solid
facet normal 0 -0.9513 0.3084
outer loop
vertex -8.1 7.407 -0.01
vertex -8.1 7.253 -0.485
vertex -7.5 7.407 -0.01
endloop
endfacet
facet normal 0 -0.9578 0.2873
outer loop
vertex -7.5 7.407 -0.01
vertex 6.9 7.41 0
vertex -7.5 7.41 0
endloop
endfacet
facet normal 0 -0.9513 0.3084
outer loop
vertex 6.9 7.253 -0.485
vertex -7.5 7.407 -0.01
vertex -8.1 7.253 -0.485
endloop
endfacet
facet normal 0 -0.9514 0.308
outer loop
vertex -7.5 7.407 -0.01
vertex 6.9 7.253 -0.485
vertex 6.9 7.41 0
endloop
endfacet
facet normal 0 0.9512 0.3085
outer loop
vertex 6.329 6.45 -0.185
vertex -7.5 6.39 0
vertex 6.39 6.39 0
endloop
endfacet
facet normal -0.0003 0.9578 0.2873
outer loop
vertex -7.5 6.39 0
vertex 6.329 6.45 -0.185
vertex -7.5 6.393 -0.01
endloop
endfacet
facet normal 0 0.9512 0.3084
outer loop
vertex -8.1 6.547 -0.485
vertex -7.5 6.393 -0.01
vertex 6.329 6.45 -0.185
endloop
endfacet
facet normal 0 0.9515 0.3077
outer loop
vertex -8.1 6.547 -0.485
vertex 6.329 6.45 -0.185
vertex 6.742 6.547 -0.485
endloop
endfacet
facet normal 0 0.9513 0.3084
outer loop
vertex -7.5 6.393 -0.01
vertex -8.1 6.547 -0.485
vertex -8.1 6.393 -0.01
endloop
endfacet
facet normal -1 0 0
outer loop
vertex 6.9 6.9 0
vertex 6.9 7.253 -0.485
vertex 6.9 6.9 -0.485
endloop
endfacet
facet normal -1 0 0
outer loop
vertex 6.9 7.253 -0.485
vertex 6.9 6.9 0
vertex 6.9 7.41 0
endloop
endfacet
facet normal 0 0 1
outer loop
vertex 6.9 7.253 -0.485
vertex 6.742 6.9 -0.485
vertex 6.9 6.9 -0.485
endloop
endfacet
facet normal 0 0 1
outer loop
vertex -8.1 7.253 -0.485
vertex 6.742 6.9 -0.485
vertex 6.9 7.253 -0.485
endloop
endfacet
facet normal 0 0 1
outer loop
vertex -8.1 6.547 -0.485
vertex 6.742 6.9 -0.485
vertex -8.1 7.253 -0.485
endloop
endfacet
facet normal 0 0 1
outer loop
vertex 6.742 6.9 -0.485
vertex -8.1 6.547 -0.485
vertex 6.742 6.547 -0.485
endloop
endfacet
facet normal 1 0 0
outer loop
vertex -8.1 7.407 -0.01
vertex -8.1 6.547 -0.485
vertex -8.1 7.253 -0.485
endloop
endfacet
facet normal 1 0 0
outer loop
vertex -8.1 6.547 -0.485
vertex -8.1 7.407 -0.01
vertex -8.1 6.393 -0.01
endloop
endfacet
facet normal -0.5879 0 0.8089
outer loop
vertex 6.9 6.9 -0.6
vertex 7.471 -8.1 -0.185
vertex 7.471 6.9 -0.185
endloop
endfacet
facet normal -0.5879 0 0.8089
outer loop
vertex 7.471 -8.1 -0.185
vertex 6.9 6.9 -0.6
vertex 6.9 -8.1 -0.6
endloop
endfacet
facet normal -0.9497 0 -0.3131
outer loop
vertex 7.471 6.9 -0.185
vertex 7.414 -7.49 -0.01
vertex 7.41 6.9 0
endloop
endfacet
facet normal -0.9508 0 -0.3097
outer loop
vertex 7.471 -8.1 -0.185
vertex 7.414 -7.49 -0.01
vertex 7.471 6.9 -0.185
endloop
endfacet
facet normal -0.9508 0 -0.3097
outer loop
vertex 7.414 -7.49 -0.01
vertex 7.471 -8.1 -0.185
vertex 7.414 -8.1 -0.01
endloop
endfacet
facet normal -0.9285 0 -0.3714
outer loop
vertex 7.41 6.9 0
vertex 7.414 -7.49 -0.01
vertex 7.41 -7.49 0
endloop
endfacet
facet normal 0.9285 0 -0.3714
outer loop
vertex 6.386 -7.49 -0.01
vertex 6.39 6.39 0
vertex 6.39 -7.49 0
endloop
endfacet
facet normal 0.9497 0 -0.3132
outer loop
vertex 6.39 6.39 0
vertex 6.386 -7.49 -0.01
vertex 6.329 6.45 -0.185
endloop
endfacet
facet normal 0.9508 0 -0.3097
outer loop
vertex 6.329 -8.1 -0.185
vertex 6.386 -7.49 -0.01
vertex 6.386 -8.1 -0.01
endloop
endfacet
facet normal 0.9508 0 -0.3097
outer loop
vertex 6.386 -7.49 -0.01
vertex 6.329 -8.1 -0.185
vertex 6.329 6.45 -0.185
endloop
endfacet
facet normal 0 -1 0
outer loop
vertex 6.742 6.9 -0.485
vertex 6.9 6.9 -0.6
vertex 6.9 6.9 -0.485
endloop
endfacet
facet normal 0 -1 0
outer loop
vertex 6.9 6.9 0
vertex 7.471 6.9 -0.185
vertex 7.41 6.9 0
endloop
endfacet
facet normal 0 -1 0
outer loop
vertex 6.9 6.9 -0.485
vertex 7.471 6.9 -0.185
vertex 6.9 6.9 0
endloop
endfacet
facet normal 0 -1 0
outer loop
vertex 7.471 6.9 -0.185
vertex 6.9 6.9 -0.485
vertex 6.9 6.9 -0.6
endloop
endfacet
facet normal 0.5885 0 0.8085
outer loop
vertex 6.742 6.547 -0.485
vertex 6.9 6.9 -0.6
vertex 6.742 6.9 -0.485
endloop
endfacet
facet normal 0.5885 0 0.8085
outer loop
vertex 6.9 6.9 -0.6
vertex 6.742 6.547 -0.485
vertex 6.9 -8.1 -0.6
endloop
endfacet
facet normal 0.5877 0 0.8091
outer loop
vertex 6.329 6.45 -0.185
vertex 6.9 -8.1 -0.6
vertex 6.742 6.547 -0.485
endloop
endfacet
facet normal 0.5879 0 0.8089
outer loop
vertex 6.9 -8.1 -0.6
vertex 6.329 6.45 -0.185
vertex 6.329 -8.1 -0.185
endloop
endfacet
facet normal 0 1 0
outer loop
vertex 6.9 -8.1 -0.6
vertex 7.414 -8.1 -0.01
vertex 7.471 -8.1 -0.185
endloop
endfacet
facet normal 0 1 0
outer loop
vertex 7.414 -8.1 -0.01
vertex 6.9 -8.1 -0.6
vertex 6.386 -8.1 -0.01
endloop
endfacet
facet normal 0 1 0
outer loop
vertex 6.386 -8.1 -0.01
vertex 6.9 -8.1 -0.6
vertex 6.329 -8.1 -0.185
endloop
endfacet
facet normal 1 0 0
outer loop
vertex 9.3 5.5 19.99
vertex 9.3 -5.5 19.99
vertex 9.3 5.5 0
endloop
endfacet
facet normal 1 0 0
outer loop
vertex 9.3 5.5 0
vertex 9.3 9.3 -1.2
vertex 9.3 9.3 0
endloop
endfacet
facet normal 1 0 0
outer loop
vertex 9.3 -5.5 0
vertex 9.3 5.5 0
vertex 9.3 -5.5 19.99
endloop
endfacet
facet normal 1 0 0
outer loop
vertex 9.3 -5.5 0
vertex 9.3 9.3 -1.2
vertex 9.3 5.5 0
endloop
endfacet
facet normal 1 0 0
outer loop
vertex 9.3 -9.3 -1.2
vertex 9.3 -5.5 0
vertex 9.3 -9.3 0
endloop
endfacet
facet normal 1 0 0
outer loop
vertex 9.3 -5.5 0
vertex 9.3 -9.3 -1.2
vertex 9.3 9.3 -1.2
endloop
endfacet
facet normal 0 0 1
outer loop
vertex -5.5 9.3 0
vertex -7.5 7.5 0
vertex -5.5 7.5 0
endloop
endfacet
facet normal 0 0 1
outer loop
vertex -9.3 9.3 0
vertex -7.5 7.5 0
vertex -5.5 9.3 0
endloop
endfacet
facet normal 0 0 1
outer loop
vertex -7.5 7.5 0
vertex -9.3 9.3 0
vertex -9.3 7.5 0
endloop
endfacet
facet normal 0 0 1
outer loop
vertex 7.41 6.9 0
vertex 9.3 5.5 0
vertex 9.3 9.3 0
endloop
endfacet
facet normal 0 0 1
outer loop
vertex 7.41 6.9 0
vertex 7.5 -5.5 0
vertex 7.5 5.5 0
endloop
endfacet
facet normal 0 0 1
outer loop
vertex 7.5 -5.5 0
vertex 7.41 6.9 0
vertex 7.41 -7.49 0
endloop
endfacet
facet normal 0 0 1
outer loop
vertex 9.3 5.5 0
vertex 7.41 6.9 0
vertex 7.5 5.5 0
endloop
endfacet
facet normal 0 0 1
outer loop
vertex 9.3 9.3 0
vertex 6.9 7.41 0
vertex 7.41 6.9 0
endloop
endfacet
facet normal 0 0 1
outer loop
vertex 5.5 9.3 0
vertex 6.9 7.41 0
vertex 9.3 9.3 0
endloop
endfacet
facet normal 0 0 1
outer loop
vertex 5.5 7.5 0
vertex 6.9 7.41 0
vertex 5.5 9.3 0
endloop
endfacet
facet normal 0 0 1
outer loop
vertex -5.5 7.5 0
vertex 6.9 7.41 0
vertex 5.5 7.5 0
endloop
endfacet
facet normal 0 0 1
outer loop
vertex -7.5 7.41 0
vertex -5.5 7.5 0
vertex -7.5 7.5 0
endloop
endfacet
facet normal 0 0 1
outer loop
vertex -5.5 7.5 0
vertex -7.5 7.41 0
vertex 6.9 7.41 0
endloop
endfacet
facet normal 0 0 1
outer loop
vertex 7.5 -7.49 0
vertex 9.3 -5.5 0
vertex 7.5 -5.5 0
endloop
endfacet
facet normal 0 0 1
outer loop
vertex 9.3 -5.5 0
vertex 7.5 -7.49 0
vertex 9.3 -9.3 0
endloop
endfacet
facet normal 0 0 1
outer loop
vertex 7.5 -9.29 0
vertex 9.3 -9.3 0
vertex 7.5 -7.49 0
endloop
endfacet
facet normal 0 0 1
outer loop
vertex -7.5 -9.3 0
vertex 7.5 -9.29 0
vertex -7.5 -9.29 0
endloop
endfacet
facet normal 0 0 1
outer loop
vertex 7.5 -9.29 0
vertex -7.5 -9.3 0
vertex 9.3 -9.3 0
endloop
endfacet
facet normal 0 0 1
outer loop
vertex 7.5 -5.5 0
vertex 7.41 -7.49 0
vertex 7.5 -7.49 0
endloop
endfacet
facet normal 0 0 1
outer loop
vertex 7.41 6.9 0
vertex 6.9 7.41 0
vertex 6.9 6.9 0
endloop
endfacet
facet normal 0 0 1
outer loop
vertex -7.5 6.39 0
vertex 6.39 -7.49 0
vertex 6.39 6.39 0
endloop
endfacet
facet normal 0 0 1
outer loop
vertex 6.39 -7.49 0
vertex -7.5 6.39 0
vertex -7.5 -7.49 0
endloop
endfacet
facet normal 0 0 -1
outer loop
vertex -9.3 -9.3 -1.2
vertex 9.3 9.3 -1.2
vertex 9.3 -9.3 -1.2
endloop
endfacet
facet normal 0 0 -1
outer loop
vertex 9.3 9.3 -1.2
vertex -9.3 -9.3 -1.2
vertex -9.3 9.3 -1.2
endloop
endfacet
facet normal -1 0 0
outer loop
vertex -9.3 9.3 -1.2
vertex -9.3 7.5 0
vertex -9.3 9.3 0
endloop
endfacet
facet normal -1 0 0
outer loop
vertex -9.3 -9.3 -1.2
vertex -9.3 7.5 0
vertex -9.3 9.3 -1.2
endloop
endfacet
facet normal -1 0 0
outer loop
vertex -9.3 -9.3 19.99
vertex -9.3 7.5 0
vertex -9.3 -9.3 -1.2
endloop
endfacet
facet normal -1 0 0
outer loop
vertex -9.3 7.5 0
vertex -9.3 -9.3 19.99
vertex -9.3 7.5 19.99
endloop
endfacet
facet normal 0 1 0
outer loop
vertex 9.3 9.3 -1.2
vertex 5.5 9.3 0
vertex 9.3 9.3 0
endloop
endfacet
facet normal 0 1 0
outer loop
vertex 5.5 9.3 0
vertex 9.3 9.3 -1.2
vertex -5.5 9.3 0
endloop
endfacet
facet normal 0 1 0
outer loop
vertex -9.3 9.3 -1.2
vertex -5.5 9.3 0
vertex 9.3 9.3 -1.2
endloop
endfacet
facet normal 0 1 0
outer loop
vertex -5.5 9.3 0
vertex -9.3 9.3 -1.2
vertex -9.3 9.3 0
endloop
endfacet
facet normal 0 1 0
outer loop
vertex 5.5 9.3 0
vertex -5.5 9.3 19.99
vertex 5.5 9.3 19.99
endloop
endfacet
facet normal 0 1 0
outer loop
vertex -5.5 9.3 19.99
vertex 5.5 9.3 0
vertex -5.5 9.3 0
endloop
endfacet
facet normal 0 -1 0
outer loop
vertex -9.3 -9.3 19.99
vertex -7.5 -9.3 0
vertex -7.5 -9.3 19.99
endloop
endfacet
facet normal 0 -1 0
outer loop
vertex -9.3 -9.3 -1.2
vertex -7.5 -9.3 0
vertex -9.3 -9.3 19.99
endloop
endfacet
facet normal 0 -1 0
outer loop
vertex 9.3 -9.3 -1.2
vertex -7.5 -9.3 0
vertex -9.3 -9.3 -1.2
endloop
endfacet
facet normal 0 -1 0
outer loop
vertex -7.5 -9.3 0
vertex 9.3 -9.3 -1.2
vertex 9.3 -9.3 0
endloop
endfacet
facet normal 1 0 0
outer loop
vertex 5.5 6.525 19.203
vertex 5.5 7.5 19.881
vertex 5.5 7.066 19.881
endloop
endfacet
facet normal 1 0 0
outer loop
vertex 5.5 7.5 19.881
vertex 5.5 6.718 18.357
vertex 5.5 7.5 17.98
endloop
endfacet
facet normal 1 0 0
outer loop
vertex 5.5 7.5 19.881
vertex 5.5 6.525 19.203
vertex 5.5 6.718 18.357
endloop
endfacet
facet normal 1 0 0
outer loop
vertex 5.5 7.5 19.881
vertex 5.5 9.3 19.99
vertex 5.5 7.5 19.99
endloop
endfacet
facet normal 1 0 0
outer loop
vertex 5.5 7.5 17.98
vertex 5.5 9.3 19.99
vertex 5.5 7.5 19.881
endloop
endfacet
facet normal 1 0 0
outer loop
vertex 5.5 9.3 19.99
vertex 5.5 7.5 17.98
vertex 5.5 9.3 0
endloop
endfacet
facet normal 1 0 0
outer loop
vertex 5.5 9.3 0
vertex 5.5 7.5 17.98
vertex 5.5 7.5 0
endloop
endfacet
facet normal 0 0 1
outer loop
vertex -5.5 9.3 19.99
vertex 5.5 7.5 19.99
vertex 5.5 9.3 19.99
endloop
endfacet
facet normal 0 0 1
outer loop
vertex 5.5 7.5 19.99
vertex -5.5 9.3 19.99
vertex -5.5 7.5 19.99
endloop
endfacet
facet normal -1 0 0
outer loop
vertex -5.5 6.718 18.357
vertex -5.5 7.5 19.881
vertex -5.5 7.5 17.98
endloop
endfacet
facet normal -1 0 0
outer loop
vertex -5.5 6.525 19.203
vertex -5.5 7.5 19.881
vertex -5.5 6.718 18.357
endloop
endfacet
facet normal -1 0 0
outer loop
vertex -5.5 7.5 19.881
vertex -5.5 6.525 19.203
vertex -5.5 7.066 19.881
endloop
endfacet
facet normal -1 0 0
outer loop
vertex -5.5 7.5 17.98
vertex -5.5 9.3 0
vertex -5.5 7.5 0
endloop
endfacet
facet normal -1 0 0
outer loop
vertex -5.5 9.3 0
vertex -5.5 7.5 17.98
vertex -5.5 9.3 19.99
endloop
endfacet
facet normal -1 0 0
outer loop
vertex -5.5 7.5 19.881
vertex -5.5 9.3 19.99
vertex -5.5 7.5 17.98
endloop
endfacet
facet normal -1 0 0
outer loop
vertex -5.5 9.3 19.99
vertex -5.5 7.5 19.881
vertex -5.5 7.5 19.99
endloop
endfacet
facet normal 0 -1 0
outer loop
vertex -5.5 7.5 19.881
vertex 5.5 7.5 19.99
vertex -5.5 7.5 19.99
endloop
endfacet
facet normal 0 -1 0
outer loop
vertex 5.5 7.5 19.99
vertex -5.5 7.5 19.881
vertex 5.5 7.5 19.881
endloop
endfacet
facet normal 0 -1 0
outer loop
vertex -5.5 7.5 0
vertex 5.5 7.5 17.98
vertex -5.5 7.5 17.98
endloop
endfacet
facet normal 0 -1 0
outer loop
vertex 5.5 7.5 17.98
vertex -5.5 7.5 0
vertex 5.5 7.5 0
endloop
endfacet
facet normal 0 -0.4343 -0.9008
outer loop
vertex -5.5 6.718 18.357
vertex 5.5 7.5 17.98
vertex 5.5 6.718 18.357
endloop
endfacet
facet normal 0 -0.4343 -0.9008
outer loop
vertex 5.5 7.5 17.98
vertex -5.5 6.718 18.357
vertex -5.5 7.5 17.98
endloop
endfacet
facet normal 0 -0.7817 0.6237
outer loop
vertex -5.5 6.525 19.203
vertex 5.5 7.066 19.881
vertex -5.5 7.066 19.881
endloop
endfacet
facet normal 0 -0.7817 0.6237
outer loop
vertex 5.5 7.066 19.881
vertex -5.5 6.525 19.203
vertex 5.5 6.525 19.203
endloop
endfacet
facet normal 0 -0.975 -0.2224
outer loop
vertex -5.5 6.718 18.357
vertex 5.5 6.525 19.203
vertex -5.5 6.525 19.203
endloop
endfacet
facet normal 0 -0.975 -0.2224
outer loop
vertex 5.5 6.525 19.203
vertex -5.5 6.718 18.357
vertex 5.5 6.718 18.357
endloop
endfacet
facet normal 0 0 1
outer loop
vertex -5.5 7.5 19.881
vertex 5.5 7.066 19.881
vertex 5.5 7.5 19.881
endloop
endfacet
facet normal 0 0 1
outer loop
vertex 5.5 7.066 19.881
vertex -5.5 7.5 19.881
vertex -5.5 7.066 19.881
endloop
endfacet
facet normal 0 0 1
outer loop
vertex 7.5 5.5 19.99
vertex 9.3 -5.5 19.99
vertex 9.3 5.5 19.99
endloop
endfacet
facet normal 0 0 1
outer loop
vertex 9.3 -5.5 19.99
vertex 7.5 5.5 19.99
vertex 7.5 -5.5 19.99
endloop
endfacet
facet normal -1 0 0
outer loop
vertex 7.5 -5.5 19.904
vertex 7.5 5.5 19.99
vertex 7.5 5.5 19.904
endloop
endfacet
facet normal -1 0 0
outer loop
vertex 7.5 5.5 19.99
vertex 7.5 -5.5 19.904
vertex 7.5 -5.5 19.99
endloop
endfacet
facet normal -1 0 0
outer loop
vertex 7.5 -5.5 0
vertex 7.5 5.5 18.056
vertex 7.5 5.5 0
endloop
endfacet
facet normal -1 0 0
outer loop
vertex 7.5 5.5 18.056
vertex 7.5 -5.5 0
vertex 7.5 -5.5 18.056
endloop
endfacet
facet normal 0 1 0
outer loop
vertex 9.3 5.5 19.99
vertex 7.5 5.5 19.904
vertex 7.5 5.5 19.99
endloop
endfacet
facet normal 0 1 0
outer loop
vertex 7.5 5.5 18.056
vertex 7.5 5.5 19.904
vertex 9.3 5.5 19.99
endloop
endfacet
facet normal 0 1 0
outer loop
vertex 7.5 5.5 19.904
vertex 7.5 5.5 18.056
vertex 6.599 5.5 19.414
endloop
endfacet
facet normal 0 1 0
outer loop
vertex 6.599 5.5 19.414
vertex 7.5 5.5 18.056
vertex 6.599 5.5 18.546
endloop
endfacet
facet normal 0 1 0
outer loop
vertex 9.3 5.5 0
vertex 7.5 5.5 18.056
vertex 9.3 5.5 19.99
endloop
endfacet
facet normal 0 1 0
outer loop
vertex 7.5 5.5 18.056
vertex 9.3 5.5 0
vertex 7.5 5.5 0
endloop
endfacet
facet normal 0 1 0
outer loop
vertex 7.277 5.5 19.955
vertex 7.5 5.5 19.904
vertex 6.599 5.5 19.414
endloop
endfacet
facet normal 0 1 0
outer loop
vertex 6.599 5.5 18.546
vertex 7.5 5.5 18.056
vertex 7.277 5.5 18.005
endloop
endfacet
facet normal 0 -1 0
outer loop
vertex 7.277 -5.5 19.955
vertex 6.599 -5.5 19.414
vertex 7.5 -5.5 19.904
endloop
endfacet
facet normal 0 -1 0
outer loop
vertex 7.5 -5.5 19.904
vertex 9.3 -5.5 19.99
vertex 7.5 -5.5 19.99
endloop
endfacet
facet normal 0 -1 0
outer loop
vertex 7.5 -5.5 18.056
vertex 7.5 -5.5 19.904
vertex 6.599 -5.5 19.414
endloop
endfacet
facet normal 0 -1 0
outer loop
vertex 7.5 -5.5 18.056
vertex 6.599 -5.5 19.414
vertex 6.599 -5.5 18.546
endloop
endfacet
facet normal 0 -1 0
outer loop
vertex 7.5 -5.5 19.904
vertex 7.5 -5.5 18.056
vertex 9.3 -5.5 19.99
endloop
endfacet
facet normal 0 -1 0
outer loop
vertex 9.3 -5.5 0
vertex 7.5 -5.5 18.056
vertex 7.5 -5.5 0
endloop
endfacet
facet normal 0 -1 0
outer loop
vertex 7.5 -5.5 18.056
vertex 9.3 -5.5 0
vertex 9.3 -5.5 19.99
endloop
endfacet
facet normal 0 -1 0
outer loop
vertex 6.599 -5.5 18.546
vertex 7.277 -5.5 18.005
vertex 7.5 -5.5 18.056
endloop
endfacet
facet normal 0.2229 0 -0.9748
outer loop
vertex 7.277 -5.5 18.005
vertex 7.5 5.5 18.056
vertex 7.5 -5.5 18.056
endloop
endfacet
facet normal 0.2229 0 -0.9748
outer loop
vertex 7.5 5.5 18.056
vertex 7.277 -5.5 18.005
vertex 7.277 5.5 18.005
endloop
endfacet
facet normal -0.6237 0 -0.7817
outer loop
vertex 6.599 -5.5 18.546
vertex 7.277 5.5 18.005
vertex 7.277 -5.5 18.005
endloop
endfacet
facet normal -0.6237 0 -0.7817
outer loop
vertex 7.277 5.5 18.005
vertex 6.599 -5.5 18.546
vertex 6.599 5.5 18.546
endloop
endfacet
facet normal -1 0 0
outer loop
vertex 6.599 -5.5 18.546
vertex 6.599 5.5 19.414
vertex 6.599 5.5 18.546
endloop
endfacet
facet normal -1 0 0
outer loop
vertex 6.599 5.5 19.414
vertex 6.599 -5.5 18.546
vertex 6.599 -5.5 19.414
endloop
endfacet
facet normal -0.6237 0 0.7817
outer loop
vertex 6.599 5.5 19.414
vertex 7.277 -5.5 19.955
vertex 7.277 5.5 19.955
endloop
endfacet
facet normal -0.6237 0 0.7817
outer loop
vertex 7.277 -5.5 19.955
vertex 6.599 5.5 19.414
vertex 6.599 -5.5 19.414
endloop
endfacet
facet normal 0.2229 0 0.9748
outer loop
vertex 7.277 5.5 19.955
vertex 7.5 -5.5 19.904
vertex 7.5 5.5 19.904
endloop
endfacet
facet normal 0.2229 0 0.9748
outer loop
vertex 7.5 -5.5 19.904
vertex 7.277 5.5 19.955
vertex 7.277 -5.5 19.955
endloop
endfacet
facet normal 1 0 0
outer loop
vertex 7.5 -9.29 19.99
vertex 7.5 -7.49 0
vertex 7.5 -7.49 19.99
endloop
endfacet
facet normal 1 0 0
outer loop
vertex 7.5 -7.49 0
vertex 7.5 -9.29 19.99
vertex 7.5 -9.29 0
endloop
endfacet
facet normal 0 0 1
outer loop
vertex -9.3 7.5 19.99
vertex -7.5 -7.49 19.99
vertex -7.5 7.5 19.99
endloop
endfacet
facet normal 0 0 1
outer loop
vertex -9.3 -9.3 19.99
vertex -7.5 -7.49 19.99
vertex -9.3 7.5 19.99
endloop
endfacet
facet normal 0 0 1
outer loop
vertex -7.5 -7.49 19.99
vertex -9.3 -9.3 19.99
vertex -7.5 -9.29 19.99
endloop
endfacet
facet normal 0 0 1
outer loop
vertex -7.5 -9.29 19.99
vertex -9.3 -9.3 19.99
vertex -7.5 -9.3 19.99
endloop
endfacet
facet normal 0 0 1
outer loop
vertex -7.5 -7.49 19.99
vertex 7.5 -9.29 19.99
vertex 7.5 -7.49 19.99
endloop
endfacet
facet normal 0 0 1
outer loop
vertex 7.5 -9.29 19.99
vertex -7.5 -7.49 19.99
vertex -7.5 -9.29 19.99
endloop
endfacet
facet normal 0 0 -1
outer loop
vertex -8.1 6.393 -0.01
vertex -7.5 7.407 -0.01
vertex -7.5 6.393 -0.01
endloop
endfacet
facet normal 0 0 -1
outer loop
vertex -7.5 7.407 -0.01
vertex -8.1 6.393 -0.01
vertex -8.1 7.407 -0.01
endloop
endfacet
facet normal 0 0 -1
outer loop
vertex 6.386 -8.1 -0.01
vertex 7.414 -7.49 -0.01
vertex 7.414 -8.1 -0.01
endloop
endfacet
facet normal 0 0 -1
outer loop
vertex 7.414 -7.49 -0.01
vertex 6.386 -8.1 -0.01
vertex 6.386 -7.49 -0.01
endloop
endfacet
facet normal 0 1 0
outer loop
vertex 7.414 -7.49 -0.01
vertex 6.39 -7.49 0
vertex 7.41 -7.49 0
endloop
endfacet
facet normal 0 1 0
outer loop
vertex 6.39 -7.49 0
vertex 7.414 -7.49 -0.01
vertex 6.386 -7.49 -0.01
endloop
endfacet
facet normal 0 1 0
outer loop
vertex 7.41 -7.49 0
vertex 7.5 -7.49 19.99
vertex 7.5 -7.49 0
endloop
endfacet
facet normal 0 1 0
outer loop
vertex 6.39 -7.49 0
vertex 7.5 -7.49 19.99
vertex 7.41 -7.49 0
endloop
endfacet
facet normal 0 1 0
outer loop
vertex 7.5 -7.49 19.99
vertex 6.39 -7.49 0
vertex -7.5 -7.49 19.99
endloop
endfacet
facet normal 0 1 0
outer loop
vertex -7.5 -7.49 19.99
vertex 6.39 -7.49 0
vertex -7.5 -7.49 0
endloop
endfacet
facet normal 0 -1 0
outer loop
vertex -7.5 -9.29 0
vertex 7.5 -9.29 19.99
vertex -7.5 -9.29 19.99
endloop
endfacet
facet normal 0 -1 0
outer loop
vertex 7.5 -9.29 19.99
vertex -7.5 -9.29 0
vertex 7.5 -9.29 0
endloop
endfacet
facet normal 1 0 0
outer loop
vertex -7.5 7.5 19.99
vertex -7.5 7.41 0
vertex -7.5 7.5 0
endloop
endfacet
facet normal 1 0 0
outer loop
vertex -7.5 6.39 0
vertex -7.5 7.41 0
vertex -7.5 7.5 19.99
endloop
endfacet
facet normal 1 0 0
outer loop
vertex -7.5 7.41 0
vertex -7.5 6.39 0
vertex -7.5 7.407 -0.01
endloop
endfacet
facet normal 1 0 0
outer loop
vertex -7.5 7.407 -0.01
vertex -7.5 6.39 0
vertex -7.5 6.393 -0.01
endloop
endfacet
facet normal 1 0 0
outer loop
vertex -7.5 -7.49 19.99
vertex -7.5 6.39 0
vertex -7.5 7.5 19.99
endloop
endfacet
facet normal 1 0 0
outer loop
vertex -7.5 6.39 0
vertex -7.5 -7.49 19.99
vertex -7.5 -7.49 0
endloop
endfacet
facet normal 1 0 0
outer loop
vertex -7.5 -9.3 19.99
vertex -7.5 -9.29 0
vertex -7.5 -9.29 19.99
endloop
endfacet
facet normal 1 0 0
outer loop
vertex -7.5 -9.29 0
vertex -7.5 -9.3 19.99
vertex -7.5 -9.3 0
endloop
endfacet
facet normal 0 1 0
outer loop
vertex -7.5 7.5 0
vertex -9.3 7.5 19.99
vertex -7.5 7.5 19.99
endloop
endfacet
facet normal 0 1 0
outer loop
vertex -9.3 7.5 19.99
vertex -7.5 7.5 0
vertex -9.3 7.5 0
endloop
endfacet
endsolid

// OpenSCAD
// -*- mode: SCAD ; c-file-style: "ellemtel" ; coding: utf-8 -*-
//
// Antiwackelfuß
// A foot to putt on a chair leg to
//
// © 2018–2021 Roland Sieker <ospalh@gmail.com>
// Licence: CC-BY-SA 4.0

/* [Global] */

// … to preview. You will get all parts as separate STLs when you click “Create Thing”.
part = "a"; // [s: Set, a: Part A, b: Part B]

// Set this to “render” and click on “Create Thing” when done with the setup.
preview = 1; // [0:render, 1:preview]

/* [Sizes] */

// Width
width = 15;  // [10:0.5:80]
// Length
length = 15;  // [10:0.5:80]

// Bottom plate hight, how much to anti-wobble
p = 1.2; // [0.2:0.1:10]

/* [Hidden] */

// Done with the customizer

// *******************************************************
// Extra parameters. These can be changed reasonably safely.


w = 1.8;  // Wall width
c = 0.4;  // Clearance
angle = 60; // Overhangs much below 60° are a problem for me
hight = 20;
g = 2; // gap;
r_n = 1;
r_r = 0.6;
// *******************************************************
// Some shortcuts. These shouldn’t be changed


module kmirror(maxis=[1, 0, 0])
{
   // Keep *and* mirror an object. Standard is left and right mirroring.
   children();
   mirror(maxis)
   {
      children();
   }
}

tau = 2 * PI;  // π is still wrong. τ = circumference / r

xy_factor = 1/tan(angle);
// To get from a hight to a horizontal width inclined correctly
z_factor = tan(angle);  // The other way around


some_distance = 50;
ms = 0.01;  // Muggeseggele.

// fn for differently sized objects and fs, fa; all for preview or rendering.
pna = 40;
pnb = 15;
pa = 5;
ps = 1;
rna = 180;
rnb = 30;
ra = 2;
rs = 0.25;
function na() = (preview) ? pna : rna;
function nb() = (preview) ? pnb : rnb;
$fs = (preview) ? ps : rs;
$fa = (preview) ? pa : ra;

// *******************************************************
// End setup



// *******************************************************
// Generate the parts

print_part();


if ("s" == part)
{
   preview_parts();
}

if ("st" == part)
{
   // Use "st" during development
   stack_parts();
}

module print_part()
{
   if ("a" == part)
   {
      anti_wobble();
   }
}

module preview_parts()
{
   part_a();
   translate([some_distance, 0, 0])
   {
      part_b();
   }
}

module stack_parts()
{
   // intersection()
   {
      color("yellow")
      {
         part_a();
      }
      translate([0,0,30])
      {
         color("red")
         {
            part_b();
         }
      }
   }
}

// *******************************************************
// Code for the parts themselves


module anti_wobble()
{

   //base
   difference()
   {
      translate([0, 0, -p/2])
      {
         cube([width + 2*w, length + 2*w, p], center=true);
      }
      // grooves
      translate([length/2-r_r, width/2-r_r])
      {
         rotate([0, -90, 0])
         {
            cylinder(r=r_r, h=length);
         }
         rotate([90, 90, 0])
         {
            cylinder(r=r_r, h=width);
         }
      }

   }

   translate([0,0,-ms])
   {
      translate([-width/2-w, -length/2-w+ms, 0])
      {
         cube([width + w, w, hight]);
      }
      translate([-width/2-w, -length/2-w, 0])
      {
         cube([w, length + w, hight]);
      }
      translate([-width/2 + g, length/2, 0])
      {
         cube([width -2*g, w, hight]);
         translate([0, 0, hight-r_n-ms])
         {
            rotate([0, 90, 0])
            {
               cylinder(r=r_n, h=width-2*g);
            }
         }
      }
      translate([width/2, -length/2 + g, 0])
      {
         cube([w, length - 2*g, hight]);
         translate([0, 0, hight-r_n-ms])
         {
            rotate([-90, 0, 0])
            {
               cylinder(r=r_n, h=length-2*g);
            }
         }
      }
   }
}
